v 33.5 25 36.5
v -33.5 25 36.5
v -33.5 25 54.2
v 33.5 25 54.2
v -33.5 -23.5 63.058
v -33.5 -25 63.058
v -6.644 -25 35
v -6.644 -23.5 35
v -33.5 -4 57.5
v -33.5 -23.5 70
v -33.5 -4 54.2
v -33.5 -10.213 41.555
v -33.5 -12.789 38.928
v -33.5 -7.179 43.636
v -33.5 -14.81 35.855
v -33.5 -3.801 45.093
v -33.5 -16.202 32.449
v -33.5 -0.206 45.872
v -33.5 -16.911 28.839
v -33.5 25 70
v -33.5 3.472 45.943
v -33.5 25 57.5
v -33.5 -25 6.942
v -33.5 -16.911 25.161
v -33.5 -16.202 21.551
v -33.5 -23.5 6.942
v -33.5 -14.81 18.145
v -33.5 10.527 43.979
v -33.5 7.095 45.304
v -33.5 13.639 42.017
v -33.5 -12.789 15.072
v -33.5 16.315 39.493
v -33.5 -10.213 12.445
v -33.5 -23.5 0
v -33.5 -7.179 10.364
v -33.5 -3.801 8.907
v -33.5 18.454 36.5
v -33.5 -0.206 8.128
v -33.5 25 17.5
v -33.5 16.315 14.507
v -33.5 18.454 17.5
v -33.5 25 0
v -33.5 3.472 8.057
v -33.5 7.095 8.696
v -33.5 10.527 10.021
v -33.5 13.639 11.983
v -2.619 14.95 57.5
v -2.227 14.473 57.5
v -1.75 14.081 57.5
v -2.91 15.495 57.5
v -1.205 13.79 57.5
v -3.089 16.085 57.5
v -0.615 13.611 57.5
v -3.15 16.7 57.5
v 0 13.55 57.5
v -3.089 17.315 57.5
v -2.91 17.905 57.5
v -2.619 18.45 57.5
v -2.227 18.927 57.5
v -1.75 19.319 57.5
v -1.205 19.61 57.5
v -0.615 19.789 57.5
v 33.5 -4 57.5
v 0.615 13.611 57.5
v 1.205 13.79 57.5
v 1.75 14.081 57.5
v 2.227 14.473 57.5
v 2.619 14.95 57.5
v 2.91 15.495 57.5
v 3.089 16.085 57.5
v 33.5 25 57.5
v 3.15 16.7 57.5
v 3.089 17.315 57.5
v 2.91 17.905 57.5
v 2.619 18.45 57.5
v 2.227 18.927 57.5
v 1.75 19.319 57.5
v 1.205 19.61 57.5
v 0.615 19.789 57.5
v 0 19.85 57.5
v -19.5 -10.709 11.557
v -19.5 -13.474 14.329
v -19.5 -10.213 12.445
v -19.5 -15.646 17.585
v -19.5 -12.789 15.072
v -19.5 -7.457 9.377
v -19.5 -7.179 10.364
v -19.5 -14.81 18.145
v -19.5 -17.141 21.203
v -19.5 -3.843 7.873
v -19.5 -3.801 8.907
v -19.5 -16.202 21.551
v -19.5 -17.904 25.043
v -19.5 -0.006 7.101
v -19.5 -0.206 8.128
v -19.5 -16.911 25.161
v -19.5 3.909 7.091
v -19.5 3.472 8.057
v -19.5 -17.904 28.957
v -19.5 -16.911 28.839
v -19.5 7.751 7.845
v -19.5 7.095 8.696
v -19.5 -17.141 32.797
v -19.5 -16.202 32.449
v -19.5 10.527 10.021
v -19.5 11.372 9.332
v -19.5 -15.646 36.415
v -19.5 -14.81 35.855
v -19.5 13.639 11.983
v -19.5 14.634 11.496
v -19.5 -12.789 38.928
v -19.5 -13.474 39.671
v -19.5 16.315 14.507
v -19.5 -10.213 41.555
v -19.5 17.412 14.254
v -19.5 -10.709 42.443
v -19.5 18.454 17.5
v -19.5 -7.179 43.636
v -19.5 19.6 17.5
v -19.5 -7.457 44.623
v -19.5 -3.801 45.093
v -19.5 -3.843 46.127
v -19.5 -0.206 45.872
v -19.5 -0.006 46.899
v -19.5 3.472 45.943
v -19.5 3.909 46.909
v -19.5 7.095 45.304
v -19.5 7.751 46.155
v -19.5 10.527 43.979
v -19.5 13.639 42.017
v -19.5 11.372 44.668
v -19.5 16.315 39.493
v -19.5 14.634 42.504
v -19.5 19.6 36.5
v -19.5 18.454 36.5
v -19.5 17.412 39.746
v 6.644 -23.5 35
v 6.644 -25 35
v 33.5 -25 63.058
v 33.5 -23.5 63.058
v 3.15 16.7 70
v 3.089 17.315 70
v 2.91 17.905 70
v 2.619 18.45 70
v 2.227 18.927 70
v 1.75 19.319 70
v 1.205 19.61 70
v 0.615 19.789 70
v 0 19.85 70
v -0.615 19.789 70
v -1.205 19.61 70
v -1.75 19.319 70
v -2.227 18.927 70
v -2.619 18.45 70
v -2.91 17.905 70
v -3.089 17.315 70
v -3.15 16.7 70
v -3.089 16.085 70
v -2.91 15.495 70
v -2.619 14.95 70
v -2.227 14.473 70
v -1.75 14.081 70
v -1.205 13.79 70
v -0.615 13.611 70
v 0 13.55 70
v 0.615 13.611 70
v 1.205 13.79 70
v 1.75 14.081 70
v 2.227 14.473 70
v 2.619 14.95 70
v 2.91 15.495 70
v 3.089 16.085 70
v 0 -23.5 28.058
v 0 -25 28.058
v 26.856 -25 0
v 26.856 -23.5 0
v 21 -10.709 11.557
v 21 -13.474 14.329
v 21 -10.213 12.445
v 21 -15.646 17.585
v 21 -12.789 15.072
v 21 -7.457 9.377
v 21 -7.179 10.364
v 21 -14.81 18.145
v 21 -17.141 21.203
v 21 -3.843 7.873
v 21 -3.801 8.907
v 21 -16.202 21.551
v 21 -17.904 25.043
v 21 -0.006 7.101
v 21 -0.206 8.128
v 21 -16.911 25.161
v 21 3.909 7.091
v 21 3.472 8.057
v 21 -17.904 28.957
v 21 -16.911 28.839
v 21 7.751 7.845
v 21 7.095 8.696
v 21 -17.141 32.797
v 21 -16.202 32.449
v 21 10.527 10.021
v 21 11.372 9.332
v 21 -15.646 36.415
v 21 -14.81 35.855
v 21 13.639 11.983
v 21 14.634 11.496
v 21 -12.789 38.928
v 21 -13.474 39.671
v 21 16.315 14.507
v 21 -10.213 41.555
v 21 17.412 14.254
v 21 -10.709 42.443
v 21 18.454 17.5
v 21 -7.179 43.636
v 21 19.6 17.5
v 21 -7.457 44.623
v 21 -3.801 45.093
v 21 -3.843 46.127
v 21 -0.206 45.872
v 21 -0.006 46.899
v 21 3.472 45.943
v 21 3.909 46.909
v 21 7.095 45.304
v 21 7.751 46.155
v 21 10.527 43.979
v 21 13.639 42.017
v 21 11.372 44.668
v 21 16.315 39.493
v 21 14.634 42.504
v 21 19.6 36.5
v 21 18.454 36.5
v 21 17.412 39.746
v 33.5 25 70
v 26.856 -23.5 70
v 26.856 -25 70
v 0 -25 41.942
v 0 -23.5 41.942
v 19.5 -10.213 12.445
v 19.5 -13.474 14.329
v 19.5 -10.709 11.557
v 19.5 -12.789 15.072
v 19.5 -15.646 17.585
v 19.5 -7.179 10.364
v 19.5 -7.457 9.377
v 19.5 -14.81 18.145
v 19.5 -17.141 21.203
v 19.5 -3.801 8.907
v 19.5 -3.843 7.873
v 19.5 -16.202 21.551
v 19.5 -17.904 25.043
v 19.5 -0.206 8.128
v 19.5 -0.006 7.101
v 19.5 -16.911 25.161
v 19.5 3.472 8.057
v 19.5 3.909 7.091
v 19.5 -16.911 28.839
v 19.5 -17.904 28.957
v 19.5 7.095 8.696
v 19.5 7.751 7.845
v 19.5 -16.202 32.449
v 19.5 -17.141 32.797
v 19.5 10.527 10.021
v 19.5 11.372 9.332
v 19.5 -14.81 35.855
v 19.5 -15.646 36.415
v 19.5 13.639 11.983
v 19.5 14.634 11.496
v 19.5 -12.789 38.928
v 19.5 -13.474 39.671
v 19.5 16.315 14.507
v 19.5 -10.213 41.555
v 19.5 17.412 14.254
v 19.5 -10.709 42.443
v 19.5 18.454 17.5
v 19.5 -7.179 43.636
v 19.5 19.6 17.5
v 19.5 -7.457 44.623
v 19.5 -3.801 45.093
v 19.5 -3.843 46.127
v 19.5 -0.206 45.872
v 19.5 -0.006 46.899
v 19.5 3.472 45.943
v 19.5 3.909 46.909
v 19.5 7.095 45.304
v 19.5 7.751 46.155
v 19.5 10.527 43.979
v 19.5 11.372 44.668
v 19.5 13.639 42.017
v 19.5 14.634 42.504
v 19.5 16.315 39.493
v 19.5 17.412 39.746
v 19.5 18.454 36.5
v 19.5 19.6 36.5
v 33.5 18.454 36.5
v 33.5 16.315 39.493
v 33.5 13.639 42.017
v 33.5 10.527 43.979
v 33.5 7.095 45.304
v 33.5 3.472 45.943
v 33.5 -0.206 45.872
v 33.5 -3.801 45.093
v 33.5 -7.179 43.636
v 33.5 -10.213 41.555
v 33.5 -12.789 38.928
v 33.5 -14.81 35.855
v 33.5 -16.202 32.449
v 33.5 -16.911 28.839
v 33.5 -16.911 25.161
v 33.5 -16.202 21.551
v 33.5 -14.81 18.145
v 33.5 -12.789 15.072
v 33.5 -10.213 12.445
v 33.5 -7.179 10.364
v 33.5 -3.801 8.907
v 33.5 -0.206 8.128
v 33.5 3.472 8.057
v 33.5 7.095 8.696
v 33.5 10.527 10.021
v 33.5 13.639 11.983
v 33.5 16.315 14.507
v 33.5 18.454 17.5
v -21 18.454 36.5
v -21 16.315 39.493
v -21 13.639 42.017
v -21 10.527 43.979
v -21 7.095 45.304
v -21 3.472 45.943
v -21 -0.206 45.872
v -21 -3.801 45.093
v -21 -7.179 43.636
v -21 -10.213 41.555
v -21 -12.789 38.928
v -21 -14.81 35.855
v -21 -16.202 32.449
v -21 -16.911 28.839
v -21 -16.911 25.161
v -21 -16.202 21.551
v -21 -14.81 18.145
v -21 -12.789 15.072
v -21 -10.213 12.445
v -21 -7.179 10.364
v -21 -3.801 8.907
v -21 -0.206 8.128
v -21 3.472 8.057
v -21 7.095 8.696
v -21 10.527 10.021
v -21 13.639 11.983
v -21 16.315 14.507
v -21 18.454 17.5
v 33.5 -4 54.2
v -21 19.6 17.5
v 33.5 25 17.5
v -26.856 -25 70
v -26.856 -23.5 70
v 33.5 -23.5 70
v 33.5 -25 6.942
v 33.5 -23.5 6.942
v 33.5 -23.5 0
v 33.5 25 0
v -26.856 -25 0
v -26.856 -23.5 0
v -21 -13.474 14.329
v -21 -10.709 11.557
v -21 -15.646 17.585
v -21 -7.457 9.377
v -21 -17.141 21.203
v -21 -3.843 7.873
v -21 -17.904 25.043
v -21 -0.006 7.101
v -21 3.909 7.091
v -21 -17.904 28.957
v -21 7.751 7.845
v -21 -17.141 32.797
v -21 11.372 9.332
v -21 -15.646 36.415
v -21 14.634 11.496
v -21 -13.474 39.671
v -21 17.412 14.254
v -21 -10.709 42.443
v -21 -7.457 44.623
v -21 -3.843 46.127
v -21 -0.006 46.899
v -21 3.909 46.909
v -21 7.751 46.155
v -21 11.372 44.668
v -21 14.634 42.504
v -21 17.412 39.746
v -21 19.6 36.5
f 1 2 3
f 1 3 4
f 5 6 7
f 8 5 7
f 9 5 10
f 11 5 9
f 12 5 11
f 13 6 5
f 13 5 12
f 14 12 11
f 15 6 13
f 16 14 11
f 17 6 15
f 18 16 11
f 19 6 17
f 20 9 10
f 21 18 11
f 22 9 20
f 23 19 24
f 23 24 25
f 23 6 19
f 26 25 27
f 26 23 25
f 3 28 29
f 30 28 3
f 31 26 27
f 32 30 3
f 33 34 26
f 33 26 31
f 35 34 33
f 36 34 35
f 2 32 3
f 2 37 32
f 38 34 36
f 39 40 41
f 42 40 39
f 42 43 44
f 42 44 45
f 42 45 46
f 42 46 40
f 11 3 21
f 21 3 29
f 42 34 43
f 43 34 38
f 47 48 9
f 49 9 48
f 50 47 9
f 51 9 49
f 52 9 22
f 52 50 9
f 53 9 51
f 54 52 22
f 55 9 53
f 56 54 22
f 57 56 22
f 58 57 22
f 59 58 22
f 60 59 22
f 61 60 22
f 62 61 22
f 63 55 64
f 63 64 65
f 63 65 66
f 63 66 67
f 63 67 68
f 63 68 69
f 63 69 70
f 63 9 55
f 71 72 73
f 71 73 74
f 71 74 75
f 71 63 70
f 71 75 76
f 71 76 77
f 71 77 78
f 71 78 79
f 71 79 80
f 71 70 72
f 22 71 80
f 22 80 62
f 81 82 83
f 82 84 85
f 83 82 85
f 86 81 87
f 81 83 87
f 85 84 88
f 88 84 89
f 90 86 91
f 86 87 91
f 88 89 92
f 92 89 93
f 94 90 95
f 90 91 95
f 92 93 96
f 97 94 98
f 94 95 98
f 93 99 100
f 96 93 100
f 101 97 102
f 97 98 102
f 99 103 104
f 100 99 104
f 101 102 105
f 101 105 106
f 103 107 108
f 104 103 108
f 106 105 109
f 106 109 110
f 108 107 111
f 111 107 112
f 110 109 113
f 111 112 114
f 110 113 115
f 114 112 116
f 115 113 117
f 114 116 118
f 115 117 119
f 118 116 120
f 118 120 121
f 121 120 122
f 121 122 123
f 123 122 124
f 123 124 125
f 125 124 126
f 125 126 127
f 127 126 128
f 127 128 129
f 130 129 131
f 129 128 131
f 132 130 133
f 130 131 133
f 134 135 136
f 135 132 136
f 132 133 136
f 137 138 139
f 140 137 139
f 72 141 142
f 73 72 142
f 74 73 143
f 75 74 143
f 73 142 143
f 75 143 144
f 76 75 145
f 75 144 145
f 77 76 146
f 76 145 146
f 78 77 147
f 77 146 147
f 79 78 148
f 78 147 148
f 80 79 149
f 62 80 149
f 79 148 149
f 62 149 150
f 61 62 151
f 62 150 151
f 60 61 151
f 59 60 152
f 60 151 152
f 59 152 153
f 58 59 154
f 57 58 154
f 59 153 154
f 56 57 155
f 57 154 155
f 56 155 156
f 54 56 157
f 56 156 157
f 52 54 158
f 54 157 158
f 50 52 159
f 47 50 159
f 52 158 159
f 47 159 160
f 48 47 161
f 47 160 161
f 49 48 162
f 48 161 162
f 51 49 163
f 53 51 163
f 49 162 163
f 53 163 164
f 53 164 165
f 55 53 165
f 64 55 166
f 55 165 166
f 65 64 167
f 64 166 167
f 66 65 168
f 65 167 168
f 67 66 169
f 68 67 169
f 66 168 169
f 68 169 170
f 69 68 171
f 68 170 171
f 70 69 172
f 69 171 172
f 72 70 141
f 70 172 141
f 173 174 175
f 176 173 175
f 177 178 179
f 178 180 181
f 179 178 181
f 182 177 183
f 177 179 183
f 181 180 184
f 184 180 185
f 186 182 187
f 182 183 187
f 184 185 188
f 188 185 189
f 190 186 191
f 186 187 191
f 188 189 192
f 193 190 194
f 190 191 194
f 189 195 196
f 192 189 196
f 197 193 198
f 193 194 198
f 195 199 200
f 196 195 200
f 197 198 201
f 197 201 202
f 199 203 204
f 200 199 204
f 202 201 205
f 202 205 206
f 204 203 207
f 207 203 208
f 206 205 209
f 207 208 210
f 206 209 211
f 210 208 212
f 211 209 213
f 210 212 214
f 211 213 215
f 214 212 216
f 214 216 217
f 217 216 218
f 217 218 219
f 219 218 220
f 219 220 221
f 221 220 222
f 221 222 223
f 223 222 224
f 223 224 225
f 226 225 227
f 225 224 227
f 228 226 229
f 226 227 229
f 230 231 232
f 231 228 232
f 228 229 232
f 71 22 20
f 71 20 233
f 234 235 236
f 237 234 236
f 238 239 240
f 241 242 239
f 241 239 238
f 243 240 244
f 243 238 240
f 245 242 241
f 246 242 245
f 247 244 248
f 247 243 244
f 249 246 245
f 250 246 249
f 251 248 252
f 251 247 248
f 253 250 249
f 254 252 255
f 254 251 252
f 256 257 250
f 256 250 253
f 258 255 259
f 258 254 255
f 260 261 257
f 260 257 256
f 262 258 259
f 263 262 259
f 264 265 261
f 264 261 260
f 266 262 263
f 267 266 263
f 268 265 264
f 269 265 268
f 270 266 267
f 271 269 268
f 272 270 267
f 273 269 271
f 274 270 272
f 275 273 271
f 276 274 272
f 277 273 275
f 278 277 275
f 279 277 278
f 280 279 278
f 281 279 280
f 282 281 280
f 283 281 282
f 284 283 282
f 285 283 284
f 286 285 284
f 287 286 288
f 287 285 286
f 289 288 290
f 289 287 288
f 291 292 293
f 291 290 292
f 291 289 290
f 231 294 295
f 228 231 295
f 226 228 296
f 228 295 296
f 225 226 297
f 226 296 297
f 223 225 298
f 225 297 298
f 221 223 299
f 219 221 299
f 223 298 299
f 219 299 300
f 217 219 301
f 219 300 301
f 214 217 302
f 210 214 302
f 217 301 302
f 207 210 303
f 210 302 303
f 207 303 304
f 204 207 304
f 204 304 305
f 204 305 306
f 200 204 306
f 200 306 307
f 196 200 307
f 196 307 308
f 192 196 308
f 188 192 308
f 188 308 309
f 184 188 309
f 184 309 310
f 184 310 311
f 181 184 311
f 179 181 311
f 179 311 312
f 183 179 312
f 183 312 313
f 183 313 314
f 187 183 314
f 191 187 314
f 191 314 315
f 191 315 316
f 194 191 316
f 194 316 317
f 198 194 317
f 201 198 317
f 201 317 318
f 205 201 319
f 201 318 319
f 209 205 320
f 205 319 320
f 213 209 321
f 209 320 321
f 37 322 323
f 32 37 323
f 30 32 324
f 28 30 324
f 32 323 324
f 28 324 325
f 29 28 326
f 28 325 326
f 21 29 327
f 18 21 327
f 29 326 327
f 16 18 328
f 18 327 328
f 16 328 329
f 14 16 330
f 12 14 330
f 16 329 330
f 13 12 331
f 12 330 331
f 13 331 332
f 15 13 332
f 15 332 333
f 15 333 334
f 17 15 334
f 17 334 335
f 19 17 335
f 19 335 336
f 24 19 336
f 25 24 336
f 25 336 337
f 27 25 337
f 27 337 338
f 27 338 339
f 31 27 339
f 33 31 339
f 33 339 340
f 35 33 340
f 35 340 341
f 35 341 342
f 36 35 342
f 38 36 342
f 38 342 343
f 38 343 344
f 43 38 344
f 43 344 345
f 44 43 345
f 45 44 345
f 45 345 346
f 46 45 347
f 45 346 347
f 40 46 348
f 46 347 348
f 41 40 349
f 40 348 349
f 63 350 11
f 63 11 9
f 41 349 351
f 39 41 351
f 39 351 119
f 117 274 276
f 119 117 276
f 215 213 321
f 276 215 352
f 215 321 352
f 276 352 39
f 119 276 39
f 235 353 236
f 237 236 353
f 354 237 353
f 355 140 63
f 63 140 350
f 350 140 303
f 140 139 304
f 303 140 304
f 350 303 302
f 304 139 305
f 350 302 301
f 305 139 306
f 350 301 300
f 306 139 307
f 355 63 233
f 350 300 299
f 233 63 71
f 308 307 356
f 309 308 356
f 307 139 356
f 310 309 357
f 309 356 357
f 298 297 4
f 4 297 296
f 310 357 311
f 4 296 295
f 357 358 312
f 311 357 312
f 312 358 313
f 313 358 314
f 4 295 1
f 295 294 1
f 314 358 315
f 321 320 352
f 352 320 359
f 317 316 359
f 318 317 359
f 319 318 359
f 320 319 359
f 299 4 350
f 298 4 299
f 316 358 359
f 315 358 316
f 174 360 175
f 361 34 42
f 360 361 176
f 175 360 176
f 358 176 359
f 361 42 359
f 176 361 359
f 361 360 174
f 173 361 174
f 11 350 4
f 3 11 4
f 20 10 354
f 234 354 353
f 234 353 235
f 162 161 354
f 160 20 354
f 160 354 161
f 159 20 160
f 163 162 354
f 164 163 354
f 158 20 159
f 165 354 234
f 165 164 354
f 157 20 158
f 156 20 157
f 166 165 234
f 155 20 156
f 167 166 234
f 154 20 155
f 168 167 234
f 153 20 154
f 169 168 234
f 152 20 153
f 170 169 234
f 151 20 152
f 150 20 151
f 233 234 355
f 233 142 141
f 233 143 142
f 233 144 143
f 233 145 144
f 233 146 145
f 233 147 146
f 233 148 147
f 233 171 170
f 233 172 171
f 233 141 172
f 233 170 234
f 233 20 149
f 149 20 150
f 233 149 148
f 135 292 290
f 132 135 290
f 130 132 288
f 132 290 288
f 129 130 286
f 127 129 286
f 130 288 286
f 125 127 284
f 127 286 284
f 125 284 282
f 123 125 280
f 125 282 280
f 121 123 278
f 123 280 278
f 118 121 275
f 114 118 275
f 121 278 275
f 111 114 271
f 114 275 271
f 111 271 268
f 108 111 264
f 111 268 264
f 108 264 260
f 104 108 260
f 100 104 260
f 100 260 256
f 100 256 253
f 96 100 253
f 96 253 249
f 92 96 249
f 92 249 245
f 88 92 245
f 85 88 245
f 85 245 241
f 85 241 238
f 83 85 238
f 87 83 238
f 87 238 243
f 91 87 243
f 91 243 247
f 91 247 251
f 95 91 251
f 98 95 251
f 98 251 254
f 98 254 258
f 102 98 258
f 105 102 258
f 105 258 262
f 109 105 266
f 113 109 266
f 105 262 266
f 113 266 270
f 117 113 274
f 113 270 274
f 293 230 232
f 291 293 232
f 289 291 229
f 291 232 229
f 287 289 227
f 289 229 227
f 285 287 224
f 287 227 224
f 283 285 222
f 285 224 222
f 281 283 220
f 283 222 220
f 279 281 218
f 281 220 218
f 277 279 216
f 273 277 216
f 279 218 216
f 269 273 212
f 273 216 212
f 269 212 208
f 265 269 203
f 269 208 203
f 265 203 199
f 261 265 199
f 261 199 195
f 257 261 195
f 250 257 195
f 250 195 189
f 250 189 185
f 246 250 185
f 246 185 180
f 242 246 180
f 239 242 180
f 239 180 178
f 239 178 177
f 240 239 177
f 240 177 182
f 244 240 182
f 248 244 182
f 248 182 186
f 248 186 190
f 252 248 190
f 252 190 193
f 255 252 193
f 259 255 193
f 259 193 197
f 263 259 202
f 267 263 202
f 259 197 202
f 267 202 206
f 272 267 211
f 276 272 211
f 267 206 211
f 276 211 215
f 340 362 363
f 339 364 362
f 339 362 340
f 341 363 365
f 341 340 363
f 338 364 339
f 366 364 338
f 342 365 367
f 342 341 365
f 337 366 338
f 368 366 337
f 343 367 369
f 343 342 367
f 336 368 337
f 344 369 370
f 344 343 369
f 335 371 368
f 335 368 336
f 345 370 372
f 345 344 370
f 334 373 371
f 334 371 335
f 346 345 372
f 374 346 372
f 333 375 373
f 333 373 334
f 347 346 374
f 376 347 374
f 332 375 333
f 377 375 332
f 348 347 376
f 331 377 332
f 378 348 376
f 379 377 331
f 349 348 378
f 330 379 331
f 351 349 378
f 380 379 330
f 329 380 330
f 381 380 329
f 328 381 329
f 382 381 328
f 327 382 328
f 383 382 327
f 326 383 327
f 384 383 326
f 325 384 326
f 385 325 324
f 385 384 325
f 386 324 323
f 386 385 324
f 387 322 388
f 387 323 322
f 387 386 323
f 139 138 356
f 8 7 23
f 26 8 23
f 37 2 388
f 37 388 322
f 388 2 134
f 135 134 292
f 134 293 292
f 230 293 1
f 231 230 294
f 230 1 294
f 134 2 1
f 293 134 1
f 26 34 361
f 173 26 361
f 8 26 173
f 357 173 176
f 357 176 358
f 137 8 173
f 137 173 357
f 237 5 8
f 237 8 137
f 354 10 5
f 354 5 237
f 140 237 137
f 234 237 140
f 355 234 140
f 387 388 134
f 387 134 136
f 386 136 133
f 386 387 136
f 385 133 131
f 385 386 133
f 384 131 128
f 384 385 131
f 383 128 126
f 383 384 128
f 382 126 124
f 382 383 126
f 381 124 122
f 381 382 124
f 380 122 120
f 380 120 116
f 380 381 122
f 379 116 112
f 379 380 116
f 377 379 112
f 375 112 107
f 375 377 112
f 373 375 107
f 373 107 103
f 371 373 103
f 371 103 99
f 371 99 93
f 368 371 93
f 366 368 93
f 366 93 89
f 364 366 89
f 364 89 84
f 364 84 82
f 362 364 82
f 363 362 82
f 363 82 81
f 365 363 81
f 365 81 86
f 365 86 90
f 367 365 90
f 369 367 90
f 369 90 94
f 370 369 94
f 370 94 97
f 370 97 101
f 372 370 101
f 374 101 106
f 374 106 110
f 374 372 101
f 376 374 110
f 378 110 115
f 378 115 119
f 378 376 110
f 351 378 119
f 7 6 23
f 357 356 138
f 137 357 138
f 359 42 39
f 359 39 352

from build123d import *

# Parameters (mm, degrees)
F0_W      = 67
F0_H      = 50
F1_DEPTH  = 70
F3_DEPTH  = 1.5
F4_W      = 58
F4_H      = 3.3
F5_DEPTH  = 67.001
F6_DEPTH  = 67.001
F7_R      = 3.15
F8_DEPTH  = 12.5
F11_R     = 20
F12_DEPTH = 1.5
F13_R     = 20
F14_DEPTH = 1.5


with BuildPart() as f1:
    # F0 (on Top) → F1 (new body)
    with BuildSketch(Plane.XY):
        Rectangle(F0_W, F0_H)
    extrude(amount=F1_DEPTH)

    # F2 (on face) → F3 (cut)
    with BuildSketch(Plane.XZ.offset(25)):
        Polygon((0, 41.941864), (-26.855644, 70), (-33.5, 70), (-33.5, 63.058136), (-6.644356, 35), (-33.5, 6.941864), (-33.5, 0), (-26.855644, 0), (0, 28.058136), (26.855644, 0), (33.5, 0), (33.5, 6.941864), (6.644356, 35), (33.5, 63.058136), (33.5, 70), (26.855644, 70), align=None)
    extrude(amount=-F3_DEPTH, mode=Mode.SUBTRACT)

    # F4 (on face) → F5 (cut, through all)
    with BuildSketch(Plane.YZ.offset(33.5)):
        with BuildLine():
            Line((33.286914, 36.5), (18.454483, 36.5))
            ThreePointArc((18.454483, 36.5), (-17, 27), (18.454483, 17.5))
            Line((18.454483, 17.5), (33.286914, 17.5))
            Line((33.286914, 17.5), (33.286914, 36.5))
        make_face()
        with Locations((25, 55.85)):
            Rectangle(F4_W, F4_H)
    extrude(amount=-F5_DEPTH, mode=Mode.SUBTRACT)

    # F4 (on face) → F6 (cut, through all)
    with BuildSketch(Plane.YZ.offset(33.5)):
        with BuildLine():
            Line((33.286914, 36.5), (18.454483, 36.5))
            ThreePointArc((18.454483, 36.5), (-17, 27), (18.454483, 17.5))
            Line((18.454483, 17.5), (33.286914, 17.5))
            Line((33.286914, 17.5), (33.286914, 36.5))
        make_face()
        with Locations((25, 55.85)):
            Rectangle(F4_W, F4_H)
    extrude(amount=-F6_DEPTH, mode=Mode.SUBTRACT)

    # F7 (on face) → F8 (cut, through all)
    with BuildSketch(Plane.XY.offset(70)):
        with Locations((0, 16.7)):
            Circle(F7_R)
    extrude(amount=-F8_DEPTH, mode=Mode.SUBTRACT)

    # F11 (on offset) → F12 (cut)
    with BuildSketch(Plane.YZ.offset(21)):
        with Locations((2, 27)):
            Circle(F11_R)
    extrude(amount=-F12_DEPTH, mode=Mode.SUBTRACT)

    # F13 (on offset) → F14 (cut)
    with BuildSketch(Plane.YZ.offset(-21)):
        with Locations((2, 27)):
            Circle(F13_R)
    extrude(amount=F14_DEPTH, mode=Mode.SUBTRACT)


solid = f1.part
